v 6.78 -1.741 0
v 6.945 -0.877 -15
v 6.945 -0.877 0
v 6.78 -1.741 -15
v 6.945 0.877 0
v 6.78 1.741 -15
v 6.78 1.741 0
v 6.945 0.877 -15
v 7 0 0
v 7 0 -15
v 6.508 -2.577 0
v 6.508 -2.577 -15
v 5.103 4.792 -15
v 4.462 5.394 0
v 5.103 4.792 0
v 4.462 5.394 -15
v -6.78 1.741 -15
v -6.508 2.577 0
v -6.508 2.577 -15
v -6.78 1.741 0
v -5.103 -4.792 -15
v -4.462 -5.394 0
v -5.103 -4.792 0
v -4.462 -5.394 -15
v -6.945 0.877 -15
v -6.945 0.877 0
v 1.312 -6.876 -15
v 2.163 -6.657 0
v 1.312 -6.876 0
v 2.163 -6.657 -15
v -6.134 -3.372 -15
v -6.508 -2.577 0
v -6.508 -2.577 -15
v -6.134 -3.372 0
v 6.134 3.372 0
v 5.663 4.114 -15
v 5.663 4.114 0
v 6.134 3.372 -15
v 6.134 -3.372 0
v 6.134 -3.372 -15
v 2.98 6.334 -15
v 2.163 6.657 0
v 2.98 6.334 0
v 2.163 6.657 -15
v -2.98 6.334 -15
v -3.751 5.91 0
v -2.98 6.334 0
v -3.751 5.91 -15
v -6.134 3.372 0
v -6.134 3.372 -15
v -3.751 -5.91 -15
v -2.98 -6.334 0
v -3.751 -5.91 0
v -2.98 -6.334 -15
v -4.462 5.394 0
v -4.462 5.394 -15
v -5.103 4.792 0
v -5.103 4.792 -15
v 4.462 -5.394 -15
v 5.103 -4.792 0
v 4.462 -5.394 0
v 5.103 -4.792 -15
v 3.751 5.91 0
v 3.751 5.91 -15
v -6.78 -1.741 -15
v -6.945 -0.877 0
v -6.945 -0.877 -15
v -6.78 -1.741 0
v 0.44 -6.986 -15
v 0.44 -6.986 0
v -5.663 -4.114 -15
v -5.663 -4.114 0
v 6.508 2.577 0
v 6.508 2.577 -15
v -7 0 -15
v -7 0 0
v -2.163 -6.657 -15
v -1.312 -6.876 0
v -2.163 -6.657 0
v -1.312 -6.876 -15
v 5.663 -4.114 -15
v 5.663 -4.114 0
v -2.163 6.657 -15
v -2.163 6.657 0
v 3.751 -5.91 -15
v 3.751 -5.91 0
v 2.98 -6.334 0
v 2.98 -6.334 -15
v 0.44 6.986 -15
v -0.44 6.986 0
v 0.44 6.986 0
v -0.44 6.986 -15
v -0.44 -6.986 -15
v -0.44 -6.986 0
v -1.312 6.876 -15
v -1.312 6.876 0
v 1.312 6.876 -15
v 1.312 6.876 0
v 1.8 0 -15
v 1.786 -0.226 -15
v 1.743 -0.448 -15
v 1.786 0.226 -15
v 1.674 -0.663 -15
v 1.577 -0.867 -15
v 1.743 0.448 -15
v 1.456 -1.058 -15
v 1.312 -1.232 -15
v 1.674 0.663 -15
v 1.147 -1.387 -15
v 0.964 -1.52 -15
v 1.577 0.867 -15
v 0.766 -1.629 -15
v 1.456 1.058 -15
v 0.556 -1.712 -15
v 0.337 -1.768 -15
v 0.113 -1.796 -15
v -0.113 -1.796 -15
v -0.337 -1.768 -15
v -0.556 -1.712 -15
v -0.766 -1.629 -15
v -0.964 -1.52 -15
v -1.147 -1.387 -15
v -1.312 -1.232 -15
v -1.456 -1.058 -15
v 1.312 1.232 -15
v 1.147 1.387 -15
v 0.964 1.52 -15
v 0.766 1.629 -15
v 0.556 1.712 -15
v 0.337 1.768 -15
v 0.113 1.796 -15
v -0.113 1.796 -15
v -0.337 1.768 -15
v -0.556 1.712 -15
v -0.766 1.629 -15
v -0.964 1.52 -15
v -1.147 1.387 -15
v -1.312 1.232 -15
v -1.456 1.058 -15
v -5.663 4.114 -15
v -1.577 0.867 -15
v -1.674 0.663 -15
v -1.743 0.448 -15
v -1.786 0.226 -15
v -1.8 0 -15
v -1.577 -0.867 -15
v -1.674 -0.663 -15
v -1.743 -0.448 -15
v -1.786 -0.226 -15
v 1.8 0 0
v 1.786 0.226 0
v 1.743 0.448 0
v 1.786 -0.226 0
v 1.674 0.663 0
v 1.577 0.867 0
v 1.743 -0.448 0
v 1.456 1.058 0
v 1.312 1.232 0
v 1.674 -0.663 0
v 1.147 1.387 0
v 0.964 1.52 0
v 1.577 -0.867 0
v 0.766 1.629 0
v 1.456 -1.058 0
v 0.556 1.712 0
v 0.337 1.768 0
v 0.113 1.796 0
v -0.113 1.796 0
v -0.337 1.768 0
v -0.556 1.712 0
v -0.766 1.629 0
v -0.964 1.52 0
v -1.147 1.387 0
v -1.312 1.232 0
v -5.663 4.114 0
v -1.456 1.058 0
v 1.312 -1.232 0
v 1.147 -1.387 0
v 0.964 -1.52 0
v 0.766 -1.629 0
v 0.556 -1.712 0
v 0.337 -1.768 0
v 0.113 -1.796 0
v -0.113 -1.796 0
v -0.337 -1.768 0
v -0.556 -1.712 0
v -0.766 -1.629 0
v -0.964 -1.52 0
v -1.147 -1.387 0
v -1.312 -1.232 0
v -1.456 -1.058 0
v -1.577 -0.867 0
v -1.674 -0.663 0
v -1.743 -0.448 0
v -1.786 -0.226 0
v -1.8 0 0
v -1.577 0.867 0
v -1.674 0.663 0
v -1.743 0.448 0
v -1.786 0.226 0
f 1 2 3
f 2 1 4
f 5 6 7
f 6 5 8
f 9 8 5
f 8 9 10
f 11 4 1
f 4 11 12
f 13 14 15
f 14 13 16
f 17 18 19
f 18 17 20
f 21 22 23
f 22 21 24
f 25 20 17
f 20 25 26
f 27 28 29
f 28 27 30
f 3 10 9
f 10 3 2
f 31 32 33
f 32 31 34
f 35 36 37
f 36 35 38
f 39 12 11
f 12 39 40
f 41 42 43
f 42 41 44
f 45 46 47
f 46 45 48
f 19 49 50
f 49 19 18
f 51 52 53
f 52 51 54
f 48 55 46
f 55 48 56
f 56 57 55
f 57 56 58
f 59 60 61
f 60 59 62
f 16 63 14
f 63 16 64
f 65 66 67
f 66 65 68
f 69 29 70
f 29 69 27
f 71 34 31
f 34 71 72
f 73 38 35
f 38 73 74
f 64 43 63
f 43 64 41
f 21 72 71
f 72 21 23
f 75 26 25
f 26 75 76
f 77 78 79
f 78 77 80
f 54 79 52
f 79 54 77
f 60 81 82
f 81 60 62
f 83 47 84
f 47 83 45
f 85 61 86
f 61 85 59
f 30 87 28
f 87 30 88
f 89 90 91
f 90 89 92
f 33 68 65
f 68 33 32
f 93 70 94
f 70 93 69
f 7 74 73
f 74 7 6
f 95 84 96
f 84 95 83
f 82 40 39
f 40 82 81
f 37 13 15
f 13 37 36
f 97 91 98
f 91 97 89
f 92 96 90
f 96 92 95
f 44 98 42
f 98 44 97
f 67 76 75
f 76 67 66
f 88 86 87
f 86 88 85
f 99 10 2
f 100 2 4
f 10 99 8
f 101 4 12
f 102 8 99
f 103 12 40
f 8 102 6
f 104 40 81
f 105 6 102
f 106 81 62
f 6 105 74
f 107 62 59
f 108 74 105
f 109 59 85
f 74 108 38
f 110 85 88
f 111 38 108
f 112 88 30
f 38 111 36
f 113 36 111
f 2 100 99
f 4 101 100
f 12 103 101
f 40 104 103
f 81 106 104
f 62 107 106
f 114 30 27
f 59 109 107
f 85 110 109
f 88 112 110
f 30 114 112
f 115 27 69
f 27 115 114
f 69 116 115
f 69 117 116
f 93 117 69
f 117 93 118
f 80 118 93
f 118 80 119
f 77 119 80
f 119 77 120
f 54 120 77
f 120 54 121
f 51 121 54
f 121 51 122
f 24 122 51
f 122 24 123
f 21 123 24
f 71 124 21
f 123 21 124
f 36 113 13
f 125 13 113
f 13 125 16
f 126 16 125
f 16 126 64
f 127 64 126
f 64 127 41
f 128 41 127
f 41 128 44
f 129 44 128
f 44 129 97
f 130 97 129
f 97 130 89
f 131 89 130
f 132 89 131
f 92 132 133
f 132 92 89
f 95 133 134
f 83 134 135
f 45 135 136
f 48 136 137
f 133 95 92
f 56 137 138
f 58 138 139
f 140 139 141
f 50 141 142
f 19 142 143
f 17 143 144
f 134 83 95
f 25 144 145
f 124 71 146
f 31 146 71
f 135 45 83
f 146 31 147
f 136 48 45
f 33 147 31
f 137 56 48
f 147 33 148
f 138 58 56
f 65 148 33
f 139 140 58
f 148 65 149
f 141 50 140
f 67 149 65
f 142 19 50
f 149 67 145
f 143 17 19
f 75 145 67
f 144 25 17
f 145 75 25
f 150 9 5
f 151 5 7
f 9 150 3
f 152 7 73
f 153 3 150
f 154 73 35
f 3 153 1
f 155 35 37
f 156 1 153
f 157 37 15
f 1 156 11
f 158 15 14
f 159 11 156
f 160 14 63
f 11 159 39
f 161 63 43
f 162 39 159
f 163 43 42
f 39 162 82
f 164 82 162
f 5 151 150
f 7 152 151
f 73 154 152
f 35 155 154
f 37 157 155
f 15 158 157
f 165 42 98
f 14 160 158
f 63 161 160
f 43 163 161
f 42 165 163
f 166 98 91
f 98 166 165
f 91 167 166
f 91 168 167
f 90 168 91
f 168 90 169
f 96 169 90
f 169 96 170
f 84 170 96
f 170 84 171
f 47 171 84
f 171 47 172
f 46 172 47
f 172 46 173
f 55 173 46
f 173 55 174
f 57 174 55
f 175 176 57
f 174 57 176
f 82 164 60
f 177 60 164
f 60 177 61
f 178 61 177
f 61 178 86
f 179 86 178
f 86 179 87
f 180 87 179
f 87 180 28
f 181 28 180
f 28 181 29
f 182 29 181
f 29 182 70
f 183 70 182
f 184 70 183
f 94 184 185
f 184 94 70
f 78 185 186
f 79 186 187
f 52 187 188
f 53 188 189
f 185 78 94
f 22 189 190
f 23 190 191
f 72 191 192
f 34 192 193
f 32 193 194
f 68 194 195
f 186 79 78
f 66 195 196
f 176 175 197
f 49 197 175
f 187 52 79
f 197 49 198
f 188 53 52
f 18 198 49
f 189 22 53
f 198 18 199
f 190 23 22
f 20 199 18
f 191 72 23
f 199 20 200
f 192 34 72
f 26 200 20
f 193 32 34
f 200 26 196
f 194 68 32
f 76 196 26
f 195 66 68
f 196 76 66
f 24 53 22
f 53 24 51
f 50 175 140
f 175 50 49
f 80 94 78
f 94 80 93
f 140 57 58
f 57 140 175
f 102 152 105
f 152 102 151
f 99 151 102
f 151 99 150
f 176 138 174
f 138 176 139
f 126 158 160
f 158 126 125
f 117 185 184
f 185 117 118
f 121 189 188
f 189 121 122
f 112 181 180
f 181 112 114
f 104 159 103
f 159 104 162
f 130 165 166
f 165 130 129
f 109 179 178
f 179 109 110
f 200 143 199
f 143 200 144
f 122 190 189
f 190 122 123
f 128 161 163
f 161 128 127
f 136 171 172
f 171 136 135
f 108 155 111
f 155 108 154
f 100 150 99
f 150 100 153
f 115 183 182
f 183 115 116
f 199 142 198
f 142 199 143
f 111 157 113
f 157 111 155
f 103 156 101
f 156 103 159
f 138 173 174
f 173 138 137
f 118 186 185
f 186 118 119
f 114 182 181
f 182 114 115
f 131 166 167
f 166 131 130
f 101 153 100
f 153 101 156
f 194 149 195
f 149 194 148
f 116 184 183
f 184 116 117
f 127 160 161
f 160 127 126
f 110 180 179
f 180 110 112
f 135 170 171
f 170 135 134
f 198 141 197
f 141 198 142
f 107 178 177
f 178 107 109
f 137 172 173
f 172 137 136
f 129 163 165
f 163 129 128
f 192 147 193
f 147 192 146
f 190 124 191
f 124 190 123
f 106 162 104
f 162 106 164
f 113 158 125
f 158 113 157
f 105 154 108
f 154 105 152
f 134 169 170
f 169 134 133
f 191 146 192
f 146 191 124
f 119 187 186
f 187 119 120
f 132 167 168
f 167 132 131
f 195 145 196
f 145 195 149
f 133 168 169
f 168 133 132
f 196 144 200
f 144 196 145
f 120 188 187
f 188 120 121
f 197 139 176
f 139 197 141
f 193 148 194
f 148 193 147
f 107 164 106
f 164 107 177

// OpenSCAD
$fn = 50;


difference() {
	union() {
		translate(v = [0, 0, -15.0000000000]) {
			cylinder(h = 15, r = 7.0000000000);
		}
		cylinder(h = 0, r = 13.0000000000);
	}
	union() {
		#translate(v = [0, 0, -15]) {
			cylinder(h = 15, r = 1.8000000000);
		}
	}
}
